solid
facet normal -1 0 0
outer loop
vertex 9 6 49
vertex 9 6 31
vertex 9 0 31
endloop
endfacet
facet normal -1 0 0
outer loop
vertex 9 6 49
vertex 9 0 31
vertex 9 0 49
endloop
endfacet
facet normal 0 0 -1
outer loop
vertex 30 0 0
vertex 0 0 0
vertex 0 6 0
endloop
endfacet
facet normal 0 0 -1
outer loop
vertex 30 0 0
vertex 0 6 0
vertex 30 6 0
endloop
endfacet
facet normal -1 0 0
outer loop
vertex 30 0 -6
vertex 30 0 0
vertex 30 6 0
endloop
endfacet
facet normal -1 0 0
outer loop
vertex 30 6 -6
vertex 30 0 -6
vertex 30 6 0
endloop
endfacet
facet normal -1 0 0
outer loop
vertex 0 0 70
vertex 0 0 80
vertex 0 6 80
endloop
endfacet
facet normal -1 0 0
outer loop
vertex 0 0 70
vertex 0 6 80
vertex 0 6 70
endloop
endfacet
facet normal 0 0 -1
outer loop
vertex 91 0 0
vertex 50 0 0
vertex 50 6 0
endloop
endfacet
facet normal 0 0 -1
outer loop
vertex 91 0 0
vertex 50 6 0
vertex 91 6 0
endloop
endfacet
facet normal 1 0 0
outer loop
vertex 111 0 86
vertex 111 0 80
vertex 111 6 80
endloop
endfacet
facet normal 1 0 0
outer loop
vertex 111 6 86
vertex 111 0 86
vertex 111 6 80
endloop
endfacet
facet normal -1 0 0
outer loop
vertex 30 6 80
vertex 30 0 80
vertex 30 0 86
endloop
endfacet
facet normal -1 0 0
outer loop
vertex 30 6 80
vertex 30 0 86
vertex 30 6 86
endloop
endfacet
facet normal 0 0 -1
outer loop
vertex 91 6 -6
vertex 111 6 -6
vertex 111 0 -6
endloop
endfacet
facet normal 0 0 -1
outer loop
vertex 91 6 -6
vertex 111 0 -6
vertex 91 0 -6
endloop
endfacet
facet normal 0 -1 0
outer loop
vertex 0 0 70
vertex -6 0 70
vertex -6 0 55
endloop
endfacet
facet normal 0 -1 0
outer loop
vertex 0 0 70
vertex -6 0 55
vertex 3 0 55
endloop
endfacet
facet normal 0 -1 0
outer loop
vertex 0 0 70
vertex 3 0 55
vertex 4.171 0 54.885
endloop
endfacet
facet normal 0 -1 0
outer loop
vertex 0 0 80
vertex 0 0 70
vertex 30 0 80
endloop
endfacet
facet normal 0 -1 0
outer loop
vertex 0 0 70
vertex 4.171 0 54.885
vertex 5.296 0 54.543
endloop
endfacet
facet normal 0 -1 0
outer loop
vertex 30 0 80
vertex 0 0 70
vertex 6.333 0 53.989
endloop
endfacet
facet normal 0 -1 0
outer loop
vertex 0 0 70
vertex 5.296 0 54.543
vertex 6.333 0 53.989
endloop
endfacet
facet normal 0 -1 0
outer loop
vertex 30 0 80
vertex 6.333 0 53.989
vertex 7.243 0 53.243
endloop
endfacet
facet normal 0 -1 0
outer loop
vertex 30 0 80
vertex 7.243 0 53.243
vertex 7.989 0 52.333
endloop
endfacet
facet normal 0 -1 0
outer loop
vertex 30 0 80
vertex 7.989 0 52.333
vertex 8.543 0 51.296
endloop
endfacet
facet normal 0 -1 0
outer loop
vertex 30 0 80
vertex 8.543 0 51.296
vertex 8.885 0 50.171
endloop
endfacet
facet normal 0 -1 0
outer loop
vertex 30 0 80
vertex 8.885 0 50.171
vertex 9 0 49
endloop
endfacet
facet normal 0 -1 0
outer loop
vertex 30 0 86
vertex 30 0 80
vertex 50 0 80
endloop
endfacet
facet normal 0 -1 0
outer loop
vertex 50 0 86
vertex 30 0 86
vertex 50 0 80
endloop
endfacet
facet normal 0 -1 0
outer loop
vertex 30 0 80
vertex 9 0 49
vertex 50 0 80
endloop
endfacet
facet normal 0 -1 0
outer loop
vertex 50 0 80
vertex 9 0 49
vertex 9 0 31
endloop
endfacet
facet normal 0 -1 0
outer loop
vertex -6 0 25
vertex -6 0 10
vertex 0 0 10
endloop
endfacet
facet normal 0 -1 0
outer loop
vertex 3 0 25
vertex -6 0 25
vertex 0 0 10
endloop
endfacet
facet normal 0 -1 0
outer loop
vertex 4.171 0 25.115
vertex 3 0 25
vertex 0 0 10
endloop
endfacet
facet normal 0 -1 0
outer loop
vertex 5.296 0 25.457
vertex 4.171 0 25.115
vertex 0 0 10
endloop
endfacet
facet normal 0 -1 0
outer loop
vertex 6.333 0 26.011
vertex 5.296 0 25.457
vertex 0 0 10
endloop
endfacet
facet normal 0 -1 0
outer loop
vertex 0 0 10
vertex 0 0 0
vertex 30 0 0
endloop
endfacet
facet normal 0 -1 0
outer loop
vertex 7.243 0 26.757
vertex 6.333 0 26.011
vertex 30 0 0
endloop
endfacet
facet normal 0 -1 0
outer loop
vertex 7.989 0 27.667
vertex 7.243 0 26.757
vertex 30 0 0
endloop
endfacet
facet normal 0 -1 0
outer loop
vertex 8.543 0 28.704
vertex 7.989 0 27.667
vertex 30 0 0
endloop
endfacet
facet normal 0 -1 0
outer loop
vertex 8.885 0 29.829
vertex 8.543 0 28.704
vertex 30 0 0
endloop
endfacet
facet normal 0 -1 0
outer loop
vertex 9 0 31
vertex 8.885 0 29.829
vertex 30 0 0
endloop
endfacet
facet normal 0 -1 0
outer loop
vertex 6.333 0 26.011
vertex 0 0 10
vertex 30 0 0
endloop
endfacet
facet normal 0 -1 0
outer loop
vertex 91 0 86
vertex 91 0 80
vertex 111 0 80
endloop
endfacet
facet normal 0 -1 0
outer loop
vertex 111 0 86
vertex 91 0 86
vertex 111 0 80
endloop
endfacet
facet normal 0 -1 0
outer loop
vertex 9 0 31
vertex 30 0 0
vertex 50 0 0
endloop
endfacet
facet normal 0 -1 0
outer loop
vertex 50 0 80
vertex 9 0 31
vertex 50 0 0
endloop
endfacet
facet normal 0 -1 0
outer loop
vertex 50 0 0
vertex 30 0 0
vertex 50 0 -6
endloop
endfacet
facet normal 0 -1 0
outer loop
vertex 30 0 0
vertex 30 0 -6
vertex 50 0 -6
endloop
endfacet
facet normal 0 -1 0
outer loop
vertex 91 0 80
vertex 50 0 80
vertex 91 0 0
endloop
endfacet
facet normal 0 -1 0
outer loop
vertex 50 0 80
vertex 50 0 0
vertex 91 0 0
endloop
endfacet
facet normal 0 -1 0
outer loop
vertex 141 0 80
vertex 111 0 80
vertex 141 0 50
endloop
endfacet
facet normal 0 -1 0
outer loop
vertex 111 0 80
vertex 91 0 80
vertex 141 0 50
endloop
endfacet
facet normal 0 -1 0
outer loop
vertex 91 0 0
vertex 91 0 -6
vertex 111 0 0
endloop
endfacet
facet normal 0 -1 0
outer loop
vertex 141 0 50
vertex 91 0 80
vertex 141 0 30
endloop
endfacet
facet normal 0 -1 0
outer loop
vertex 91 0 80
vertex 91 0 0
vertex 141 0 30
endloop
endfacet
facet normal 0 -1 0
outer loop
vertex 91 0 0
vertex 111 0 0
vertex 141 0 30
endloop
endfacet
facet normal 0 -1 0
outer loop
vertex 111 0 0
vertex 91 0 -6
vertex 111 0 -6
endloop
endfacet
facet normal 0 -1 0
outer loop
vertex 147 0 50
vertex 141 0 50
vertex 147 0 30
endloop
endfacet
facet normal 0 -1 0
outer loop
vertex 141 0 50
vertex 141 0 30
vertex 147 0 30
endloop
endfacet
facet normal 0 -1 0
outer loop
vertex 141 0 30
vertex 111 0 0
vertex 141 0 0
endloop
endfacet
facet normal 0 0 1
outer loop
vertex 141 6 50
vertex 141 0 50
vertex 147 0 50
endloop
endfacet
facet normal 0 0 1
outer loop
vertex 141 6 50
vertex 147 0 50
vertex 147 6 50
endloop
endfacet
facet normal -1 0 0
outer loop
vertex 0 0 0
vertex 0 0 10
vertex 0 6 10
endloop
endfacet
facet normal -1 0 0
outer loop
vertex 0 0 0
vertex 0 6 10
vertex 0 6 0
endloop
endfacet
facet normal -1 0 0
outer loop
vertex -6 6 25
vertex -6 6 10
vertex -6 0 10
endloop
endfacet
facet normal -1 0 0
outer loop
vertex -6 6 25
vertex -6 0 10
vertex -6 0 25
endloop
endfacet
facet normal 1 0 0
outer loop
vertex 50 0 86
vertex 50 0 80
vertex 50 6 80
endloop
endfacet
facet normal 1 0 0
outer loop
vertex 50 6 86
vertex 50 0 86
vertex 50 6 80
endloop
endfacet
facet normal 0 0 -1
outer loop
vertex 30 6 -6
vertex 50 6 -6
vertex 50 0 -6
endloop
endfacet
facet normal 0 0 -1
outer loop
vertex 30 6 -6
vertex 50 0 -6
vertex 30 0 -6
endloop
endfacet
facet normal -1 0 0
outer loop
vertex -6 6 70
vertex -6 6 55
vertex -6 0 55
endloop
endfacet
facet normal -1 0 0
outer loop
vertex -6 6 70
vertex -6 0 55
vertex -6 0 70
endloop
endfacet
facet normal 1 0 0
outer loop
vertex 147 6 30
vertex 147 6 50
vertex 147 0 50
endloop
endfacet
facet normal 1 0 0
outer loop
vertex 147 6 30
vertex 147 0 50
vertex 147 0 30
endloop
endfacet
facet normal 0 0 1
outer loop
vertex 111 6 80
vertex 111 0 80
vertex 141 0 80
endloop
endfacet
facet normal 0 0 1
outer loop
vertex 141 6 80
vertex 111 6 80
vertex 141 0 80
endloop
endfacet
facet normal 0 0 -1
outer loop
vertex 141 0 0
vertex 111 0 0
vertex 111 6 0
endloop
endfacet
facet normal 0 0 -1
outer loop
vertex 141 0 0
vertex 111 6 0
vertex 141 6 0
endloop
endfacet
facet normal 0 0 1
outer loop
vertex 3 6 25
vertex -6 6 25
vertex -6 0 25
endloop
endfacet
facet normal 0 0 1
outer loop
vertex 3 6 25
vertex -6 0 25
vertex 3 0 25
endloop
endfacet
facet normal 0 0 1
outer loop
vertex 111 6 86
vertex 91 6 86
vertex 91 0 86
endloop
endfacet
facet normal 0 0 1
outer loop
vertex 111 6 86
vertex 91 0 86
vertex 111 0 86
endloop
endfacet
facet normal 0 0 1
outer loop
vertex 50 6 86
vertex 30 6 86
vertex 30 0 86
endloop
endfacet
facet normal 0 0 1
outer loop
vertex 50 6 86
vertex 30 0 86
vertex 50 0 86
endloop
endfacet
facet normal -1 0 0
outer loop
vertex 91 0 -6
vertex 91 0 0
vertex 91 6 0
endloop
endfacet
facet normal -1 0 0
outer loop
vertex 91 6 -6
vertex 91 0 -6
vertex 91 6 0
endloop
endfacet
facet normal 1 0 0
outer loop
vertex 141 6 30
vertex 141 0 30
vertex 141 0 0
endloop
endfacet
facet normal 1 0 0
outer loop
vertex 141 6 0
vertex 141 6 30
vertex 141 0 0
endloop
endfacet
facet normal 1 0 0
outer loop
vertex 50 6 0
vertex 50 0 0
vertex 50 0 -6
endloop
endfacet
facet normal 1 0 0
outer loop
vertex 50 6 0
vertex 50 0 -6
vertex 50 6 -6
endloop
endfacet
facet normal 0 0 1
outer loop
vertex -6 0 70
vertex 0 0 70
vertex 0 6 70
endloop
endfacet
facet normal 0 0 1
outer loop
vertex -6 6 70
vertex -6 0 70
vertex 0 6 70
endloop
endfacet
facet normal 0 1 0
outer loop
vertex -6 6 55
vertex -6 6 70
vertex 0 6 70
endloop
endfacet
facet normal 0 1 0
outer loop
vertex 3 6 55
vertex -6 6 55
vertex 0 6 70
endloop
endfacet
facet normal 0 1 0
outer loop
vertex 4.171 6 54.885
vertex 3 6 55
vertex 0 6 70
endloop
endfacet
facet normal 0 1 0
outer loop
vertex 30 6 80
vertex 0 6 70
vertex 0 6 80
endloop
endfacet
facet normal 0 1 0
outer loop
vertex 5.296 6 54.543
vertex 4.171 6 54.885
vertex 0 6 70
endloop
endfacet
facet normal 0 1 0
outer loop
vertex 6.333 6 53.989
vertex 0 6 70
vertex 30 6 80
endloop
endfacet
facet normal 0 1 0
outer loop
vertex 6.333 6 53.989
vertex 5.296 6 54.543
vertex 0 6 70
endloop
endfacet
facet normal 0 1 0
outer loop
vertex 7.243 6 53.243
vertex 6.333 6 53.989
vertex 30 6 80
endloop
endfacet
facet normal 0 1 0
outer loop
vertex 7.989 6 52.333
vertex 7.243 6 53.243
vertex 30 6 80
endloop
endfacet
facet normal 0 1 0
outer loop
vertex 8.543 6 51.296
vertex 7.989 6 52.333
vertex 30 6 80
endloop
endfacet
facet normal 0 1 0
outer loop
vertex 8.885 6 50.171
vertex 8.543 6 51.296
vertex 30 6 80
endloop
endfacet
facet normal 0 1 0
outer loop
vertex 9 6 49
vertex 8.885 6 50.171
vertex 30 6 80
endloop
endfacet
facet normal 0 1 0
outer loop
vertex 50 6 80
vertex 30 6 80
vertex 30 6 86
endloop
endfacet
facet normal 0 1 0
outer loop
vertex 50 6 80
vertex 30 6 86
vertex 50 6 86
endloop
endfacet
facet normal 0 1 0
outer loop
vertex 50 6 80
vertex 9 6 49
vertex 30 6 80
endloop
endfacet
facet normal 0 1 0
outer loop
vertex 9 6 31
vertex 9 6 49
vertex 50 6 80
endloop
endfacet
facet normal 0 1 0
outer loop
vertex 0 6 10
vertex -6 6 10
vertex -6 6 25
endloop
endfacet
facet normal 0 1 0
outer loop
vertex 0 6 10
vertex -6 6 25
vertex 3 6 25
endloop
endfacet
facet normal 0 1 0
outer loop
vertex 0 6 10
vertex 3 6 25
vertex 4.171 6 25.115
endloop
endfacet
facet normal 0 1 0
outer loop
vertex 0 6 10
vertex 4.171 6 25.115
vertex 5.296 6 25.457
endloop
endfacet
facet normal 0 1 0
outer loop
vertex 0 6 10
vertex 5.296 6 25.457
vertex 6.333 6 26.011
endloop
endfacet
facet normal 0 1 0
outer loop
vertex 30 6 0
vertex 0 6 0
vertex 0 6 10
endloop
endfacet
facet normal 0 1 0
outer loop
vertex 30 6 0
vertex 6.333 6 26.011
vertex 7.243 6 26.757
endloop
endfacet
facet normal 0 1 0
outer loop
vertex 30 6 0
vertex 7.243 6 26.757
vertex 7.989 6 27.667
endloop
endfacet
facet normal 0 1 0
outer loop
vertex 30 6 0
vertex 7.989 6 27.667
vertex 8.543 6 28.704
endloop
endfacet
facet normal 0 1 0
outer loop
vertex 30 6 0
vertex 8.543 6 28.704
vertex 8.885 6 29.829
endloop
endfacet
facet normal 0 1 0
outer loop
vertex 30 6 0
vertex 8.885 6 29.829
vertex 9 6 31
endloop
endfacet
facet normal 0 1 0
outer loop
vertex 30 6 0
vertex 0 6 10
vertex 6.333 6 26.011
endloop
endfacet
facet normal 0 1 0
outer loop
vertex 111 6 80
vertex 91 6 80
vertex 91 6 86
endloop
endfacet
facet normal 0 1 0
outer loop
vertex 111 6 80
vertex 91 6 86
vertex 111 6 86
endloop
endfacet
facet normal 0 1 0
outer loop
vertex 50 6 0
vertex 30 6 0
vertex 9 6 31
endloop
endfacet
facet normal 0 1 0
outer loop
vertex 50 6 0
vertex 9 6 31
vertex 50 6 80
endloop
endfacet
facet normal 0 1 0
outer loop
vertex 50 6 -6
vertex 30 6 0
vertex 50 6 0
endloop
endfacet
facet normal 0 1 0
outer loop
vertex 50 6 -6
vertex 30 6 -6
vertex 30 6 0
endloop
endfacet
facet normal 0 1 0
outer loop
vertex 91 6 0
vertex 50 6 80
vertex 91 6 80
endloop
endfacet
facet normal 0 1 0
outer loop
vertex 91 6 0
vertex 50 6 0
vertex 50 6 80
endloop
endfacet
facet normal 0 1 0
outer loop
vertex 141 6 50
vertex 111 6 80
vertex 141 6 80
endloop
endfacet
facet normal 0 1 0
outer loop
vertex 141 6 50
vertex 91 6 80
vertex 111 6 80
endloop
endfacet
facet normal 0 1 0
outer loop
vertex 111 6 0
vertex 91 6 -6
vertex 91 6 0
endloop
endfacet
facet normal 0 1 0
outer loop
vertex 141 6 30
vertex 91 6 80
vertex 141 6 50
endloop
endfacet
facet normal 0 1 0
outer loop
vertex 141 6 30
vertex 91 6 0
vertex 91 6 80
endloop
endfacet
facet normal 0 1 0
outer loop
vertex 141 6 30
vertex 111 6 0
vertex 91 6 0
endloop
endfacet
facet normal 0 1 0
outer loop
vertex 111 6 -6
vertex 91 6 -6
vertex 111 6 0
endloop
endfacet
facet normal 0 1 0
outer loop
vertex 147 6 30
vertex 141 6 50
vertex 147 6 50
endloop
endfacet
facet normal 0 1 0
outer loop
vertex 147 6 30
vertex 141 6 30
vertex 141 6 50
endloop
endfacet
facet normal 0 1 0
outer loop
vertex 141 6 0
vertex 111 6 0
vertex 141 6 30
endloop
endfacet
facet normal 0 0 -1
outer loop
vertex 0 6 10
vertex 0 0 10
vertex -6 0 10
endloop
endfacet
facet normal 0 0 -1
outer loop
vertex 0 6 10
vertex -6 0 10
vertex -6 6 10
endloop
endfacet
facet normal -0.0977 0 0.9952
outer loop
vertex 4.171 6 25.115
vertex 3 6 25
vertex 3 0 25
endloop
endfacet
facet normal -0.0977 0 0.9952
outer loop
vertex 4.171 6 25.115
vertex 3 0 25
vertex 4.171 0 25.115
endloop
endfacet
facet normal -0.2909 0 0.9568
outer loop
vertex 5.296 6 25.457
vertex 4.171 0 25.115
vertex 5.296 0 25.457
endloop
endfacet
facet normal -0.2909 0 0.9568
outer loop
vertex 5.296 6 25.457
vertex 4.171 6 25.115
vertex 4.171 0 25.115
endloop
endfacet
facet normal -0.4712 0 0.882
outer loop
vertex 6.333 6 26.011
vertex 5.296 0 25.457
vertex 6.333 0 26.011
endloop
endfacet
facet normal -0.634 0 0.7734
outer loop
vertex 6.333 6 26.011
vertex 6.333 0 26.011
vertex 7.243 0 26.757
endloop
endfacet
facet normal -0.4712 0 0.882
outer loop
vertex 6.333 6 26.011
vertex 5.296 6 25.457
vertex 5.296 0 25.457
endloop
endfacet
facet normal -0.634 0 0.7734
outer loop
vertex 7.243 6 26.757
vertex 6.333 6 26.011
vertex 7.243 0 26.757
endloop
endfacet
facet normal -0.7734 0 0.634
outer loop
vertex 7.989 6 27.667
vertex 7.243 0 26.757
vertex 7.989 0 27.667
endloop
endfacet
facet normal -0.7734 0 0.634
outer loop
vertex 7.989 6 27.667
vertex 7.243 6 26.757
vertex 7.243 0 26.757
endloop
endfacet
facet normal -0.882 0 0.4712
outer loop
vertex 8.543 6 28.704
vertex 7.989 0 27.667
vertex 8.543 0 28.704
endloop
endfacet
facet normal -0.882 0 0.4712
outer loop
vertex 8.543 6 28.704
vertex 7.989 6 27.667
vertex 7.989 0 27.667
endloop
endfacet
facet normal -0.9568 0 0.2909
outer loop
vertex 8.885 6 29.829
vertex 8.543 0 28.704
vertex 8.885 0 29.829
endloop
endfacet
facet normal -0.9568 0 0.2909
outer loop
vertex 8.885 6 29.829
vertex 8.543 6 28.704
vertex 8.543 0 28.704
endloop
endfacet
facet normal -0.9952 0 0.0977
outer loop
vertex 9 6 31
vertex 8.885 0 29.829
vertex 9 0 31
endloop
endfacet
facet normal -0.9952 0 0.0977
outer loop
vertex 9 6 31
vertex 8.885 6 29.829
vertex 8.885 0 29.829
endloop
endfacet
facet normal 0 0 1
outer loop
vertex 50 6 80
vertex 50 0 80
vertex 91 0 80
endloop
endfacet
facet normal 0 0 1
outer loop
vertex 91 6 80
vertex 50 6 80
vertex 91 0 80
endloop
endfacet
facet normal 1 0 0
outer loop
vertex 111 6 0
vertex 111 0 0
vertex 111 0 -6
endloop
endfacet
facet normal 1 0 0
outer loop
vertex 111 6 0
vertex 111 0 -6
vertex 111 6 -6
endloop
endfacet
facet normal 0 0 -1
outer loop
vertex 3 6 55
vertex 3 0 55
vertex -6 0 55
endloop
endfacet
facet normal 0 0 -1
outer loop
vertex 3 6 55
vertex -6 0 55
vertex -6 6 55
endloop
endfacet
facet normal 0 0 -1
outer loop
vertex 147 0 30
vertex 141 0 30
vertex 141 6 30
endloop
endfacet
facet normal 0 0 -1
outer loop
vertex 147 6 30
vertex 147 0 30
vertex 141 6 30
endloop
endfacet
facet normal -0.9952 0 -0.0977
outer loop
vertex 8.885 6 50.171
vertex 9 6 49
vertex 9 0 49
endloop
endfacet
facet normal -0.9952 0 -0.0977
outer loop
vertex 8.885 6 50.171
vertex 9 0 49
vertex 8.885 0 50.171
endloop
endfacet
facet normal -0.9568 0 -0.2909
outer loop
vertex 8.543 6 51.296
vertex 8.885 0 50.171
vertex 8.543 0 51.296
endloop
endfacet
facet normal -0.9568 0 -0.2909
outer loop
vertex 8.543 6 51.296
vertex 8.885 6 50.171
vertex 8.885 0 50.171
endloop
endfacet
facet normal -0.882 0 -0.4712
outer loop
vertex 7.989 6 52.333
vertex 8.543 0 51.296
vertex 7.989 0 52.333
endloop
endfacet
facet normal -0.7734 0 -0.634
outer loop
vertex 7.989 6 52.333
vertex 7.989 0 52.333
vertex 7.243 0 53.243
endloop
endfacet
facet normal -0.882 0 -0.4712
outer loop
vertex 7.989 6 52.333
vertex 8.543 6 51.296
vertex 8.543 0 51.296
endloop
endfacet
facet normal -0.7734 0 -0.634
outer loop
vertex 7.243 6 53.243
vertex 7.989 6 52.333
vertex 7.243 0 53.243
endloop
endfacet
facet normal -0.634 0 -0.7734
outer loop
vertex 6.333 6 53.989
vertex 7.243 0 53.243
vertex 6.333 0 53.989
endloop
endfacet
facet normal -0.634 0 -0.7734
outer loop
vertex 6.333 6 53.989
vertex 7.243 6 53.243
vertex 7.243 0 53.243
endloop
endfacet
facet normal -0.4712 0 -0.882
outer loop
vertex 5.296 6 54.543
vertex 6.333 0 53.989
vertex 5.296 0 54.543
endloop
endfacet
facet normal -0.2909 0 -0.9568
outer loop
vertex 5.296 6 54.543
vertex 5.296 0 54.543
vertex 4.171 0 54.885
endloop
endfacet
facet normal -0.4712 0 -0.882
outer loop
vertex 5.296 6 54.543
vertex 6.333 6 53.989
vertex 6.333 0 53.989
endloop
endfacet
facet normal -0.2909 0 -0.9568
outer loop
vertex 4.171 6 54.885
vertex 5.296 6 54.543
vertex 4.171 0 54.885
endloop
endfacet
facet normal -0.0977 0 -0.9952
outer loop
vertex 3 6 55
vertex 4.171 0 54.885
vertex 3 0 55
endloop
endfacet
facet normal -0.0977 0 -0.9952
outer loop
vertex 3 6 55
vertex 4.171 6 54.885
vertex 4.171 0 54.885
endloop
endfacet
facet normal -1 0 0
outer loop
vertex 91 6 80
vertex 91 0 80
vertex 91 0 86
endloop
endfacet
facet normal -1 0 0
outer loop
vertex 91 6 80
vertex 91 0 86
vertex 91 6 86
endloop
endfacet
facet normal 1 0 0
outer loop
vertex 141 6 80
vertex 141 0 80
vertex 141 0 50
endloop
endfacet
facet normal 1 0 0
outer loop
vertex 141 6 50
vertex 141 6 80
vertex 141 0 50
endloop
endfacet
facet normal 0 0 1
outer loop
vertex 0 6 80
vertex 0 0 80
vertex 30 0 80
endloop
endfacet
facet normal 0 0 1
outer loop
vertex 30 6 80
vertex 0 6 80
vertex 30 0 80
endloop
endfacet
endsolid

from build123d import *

# Parameters (mm, degrees)
SKETCH1_W           = 141
SKETCH1_H           = 80
BOSS_EXTRUDE1_DEPTH = 6
SKETCH2_W           = 20
SKETCH2_H           = 6
BOSS_EXTRUDE2_DEPTH = 6
SKETCH3_W           = 20
SKETCH3_H           = 6
BOSS_EXTRUDE3_DEPTH = 6
SKETCH4_W           = 15
SKETCH4_H           = 6
BOSS_EXTRUDE4_DEPTH = 6
SKETCH5_W           = 20
SKETCH5_H           = 6
BOSS_EXTRUDE5_DEPTH = 6
CUT_EXTRUDE1_DEPTH  = 6


with BuildPart() as part:
    # Sketch1 → Boss-Extrude1 (new body)
    with BuildSketch(Plane(origin=(0, 0, 0), x_dir=(1, 0, 0), z_dir=(0, 1, 0))):
        with Locations((70.5, -40)):
            Rectangle(SKETCH1_W, SKETCH1_H)
    extrude(amount=BOSS_EXTRUDE1_DEPTH)

    # Sketch2 → Boss-Extrude2 (add)
    with BuildSketch(Plane.XY.offset(80)):
        with Locations((40, 3)):
            Rectangle(SKETCH2_W, SKETCH2_H)
        with Locations((101, 3)):
            Rectangle(SKETCH2_W, SKETCH2_H)
    extrude(amount=BOSS_EXTRUDE2_DEPTH)

    # Sketch3 → Boss-Extrude3 (add)
    with BuildSketch(Plane(origin=(0, 0, 0), x_dir=(-1, 0, 0), z_dir=(0, 0, -1))):
        with Locations((-101, 3)):
            Rectangle(SKETCH3_W, SKETCH3_H)
        with Locations((-40, 3)):
            Rectangle(SKETCH3_W, SKETCH3_H)
    extrude(amount=BOSS_EXTRUDE3_DEPTH)

    # Sketch4 → Boss-Extrude4 (add)
    with BuildSketch(Plane.ZY):
        with Locations((17.5, 3)):
            Rectangle(SKETCH4_W, SKETCH4_H)
        with Locations((62.5, 3)):
            Rectangle(SKETCH4_W, SKETCH4_H)
    extrude(amount=BOSS_EXTRUDE4_DEPTH)

    # Sketch5 → Boss-Extrude5 (add)
    with BuildSketch(Plane(origin=(141, 0, 0), x_dir=(0, 0, -1), z_dir=(1, 0, 0))):
        with Locations((-40, 3)):
            Rectangle(SKETCH5_W, SKETCH5_H)
    extrude(amount=BOSS_EXTRUDE5_DEPTH)

    # Sketch6 → Cut-Extrude1 (cut)
    with BuildSketch(Plane(origin=(0, 6, 0), x_dir=(1, 0, 0), z_dir=(0, 1, 0))):
        with BuildLine():
            Line((0, -25), (3, -25))
            ThreePointArc((3, -25), (7.242640687, -26.757359313), (9, -31))
            Line((9, -31), (9, -49))
            ThreePointArc((9, -49), (7.242640687, -53.242640687), (3, -55))
            Line((3, -55), (0, -55))
            Line((0, -55), (0, -25))
        make_face()
    extrude(amount=-CUT_EXTRUDE1_DEPTH, mode=Mode.SUBTRACT)


solid = part.part
